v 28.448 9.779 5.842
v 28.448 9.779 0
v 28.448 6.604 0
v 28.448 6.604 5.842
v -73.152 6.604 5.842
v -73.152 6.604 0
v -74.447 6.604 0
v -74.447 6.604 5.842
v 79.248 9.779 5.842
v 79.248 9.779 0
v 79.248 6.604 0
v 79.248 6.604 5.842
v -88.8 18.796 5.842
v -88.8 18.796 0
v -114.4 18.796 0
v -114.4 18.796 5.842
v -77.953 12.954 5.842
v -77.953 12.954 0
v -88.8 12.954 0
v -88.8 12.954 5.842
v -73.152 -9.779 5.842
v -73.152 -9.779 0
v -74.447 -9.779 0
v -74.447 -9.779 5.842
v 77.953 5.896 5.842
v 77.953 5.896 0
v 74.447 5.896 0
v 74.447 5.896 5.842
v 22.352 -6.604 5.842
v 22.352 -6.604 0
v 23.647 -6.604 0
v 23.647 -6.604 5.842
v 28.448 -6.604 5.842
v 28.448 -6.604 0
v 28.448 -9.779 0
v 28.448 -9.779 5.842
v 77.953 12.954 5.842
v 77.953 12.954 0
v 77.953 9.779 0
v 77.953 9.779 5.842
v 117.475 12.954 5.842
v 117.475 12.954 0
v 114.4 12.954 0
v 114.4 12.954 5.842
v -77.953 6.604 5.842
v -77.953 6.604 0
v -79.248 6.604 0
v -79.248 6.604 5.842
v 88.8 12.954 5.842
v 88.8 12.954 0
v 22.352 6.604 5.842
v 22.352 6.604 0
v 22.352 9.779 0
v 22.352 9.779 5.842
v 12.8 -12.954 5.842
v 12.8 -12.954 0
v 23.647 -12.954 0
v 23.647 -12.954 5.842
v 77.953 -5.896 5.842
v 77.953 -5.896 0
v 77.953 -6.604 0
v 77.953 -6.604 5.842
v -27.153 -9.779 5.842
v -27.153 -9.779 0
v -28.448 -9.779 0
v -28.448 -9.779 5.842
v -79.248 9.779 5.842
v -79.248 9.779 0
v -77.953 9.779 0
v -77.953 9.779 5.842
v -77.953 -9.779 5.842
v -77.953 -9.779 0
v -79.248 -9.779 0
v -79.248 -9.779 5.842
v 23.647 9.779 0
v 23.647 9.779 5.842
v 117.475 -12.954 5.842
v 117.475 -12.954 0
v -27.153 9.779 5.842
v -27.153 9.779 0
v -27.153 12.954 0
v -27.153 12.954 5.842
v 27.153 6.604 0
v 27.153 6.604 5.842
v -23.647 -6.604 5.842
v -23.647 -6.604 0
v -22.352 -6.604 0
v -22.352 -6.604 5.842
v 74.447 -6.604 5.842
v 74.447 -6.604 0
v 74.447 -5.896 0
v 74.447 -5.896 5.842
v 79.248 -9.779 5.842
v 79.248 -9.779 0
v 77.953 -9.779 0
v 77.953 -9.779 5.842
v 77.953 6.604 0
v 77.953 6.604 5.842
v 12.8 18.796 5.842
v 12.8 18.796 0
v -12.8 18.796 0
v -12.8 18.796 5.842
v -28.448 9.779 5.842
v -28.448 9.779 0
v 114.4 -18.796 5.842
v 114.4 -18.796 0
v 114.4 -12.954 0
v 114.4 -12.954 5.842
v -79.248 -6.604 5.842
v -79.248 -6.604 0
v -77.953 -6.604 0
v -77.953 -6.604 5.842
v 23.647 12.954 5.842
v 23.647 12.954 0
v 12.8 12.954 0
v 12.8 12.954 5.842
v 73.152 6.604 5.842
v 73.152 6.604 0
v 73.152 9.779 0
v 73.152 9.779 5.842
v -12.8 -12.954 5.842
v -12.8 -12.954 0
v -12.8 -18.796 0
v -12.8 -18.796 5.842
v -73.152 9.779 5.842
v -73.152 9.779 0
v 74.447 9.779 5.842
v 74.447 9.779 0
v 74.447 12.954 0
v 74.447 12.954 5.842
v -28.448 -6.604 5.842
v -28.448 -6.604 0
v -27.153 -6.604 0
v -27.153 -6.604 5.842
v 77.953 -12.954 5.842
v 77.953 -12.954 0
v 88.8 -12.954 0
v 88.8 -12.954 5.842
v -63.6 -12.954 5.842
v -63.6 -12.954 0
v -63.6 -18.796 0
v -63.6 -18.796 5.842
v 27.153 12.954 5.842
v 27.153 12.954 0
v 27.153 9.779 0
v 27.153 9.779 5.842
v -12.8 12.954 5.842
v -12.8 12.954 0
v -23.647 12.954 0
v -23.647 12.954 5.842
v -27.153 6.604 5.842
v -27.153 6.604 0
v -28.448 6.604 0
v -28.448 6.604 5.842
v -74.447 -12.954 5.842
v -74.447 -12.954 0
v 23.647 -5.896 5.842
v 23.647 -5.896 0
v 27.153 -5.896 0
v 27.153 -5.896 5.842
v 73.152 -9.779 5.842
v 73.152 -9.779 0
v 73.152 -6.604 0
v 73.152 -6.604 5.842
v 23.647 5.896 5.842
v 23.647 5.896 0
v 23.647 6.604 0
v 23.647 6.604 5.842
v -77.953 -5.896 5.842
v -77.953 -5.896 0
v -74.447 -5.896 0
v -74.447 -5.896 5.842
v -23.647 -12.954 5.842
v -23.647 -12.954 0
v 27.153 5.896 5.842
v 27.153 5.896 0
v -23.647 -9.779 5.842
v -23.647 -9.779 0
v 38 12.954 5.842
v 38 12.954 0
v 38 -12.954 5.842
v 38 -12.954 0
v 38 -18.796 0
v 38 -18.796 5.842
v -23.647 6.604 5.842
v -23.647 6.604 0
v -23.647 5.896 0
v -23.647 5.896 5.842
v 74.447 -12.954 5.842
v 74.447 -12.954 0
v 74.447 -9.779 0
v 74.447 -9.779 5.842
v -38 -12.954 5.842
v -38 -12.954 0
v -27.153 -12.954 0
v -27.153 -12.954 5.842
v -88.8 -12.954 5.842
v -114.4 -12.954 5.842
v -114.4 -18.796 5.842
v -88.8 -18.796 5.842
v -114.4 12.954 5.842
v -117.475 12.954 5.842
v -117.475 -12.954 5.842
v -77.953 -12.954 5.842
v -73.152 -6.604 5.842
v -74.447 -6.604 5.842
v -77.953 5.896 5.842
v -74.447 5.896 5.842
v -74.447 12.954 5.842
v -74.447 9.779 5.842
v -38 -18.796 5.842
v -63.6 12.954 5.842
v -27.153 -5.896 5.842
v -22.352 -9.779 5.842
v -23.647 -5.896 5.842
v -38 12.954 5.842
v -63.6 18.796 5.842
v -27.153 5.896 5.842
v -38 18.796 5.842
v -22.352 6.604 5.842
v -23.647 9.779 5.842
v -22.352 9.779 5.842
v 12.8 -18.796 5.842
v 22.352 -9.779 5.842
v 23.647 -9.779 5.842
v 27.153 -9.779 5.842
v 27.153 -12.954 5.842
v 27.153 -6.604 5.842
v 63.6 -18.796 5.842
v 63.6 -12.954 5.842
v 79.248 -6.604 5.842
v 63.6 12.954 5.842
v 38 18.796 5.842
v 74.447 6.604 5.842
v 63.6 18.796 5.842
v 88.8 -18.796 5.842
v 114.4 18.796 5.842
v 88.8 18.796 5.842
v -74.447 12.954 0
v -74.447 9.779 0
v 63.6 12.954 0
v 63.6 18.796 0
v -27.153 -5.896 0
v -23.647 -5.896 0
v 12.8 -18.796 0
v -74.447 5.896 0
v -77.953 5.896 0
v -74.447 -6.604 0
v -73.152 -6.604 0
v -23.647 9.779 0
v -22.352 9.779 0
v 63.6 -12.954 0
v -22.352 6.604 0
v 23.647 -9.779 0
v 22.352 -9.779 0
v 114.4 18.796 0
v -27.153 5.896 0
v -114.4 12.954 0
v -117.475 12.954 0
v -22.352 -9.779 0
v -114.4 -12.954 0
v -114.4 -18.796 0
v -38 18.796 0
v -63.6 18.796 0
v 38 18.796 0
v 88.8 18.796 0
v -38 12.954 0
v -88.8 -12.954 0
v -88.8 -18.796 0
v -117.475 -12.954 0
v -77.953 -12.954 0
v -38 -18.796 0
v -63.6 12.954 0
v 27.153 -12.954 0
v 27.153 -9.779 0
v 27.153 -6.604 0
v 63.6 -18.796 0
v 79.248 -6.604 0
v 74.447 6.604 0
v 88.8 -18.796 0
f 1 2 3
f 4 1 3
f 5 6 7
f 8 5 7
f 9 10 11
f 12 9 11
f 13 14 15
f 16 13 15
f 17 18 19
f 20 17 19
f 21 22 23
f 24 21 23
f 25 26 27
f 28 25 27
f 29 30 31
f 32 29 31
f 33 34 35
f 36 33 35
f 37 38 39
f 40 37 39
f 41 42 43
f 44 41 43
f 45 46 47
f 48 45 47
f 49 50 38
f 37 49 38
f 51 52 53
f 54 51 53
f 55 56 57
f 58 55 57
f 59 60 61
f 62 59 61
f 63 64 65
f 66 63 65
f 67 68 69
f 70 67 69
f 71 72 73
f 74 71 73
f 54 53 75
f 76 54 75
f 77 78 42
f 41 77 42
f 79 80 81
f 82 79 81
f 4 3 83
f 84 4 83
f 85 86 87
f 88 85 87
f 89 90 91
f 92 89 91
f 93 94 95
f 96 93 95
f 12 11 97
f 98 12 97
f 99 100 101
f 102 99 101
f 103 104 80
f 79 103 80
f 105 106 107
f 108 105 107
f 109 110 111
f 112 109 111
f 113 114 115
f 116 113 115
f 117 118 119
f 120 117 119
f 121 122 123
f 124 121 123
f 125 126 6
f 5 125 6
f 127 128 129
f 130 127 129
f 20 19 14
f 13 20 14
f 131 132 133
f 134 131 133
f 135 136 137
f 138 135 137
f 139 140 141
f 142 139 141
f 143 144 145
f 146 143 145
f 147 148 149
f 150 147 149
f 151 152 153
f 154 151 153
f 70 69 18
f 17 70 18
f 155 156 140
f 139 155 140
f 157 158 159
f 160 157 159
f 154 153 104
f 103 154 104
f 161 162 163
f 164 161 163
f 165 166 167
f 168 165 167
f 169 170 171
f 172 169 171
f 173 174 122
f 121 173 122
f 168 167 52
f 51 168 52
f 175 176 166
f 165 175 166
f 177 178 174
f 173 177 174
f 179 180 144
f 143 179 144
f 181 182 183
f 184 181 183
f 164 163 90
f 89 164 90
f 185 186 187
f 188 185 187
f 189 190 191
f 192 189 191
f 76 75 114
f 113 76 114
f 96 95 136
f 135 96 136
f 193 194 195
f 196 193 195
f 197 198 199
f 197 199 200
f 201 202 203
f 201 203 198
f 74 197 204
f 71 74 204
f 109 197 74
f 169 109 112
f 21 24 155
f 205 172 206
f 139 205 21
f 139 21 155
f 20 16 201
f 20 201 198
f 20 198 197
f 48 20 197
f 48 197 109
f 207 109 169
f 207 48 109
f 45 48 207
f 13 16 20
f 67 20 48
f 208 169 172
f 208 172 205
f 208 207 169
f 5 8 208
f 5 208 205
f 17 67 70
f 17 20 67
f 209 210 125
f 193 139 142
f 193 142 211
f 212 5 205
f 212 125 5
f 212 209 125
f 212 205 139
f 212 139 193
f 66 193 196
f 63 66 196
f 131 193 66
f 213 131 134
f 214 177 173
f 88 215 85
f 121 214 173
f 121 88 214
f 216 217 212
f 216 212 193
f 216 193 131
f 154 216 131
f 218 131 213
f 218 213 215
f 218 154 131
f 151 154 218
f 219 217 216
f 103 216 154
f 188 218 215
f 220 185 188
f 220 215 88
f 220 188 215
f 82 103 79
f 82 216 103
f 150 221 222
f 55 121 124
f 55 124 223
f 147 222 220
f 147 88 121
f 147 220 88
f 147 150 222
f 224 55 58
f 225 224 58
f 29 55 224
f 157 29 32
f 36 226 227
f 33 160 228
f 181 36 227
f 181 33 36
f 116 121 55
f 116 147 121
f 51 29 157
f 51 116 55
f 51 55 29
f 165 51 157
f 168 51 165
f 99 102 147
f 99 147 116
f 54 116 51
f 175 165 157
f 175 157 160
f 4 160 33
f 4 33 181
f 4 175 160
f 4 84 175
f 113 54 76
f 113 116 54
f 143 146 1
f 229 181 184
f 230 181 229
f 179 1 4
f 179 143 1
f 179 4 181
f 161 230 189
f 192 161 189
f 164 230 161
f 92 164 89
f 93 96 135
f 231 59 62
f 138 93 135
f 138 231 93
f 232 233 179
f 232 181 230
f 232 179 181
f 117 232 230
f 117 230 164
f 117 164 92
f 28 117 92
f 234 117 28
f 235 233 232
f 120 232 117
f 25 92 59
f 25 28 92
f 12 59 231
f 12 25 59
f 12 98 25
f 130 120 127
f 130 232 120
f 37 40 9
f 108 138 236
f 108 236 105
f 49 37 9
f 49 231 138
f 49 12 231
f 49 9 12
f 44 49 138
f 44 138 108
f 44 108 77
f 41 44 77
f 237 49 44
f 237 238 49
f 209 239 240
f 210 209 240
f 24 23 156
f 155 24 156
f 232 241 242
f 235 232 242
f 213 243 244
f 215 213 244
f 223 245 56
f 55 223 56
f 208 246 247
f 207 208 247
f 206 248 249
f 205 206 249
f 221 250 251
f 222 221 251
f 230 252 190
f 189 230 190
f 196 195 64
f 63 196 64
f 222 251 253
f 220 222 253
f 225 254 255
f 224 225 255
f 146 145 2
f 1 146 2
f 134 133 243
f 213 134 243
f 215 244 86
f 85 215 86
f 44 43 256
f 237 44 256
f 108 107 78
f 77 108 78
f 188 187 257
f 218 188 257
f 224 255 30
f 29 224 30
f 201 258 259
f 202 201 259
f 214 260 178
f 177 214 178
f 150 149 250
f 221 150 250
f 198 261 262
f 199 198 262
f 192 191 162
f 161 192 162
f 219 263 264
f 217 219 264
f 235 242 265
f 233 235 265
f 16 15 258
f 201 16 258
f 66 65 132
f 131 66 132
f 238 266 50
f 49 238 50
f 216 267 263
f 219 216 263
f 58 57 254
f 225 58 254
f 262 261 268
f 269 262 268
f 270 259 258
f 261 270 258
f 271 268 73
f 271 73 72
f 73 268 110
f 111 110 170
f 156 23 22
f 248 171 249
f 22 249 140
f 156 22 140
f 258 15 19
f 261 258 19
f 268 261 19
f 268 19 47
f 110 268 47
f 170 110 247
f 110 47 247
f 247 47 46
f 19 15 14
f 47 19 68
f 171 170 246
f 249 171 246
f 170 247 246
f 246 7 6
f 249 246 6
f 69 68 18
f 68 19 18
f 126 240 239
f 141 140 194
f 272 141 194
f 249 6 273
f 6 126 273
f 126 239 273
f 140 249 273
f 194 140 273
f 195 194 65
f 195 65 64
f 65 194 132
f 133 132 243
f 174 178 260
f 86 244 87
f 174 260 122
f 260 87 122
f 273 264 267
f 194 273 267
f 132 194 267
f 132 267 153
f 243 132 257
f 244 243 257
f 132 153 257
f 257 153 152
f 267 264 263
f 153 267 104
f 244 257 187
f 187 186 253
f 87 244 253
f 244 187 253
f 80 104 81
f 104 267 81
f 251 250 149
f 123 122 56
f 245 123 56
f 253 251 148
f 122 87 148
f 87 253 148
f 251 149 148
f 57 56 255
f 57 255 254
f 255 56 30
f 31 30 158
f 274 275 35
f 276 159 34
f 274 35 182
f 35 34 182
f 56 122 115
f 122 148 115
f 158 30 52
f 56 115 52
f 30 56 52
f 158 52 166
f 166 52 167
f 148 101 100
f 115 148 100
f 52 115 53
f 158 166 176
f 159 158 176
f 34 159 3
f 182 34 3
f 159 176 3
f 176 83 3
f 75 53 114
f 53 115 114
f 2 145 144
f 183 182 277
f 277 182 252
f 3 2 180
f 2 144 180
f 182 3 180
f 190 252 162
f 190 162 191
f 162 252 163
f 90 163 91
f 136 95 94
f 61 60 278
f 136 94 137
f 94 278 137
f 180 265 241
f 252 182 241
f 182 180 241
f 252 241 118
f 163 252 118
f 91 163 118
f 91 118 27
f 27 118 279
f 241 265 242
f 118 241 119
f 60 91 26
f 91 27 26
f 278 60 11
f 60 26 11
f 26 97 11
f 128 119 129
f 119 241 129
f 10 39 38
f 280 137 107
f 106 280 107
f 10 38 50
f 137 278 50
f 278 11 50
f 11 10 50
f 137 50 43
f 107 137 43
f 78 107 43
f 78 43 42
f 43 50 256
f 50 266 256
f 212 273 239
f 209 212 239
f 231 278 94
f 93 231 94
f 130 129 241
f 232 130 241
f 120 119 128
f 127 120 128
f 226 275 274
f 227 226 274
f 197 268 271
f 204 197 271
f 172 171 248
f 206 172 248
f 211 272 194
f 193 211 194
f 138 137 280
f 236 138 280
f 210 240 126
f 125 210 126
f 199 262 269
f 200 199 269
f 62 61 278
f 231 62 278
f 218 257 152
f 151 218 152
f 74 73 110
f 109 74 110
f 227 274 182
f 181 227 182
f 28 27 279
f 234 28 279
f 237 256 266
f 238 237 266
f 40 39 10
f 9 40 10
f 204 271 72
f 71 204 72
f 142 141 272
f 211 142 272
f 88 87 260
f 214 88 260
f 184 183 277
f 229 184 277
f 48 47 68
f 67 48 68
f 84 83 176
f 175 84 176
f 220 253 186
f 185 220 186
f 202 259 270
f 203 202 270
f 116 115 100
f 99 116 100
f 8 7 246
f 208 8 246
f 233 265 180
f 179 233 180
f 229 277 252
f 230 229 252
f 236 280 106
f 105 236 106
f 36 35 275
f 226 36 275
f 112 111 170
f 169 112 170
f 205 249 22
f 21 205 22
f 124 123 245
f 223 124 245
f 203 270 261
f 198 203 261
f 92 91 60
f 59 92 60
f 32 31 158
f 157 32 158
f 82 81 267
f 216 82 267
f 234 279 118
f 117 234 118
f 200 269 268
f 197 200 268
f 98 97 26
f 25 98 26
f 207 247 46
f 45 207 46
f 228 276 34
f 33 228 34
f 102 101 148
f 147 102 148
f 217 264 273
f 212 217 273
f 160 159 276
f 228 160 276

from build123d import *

# Parameters (mm, degrees)
BOSS_EXTRUDE1_DEPTH = 5.842


with BuildPart() as part:
    # Sketch1 → Boss-Extrude1 (new body)
    with BuildSketch(Plane.XY):
        Polygon((-38, 18.796), (-63.6, 18.796), (-63.6, 12.954), (-74.4474, 12.954), (-74.4474, 9.779), (-73.152, 9.779), (-73.152, 6.604), (-74.4474, 6.604), (-74.4474, 5.896), (-77.9526, 5.896), (-77.9526, 6.604), (-79.248, 6.604), (-79.248, 9.779), (-77.9526, 9.779), (-77.9526, 12.954), (-88.8, 12.954), (-88.8, 18.796), (-114.4, 18.796), (-114.4, 12.954), (-117.475, 12.954), (-117.475, -12.954), (-114.4, -12.954), (-114.4, -18.796), (-88.8, -18.796), (-88.8, -12.954), (-77.9526, -12.954), (-77.9526, -9.779), (-79.248, -9.779), (-79.248, -6.604), (-77.9526, -6.604), (-77.9526, -5.896), (-74.4474, -5.896), (-74.4474, -6.604), (-73.152, -6.604), (-73.152, -9.779), (-74.4474, -9.779), (-74.4474, -12.954), (-63.6, -12.954), (-63.6, -18.796), (-38, -18.796), (-38, -12.954), (-27.1526, -12.954), (-27.1526, -9.779), (-28.448, -9.779), (-28.448, -6.604), (-27.1526, -6.604), (-27.1526, -5.896), (-23.6474, -5.896), (-23.6474, -6.604), (-22.352, -6.604), (-22.352, -9.779), (-23.6474, -9.779), (-23.6474, -12.954), (-12.8, -12.954), (-12.8, -18.796), (12.8, -18.796), (12.8, -12.954), (23.6474, -12.954), (23.6474, -9.779), (22.352, -9.779), (22.352, -6.604), (23.6474, -6.604), (23.6474, -5.896), (27.1526, -5.896), (27.1526, -6.604), (28.448, -6.604), (28.448, -9.779), (27.1526, -9.779), (27.1526, -12.954), (38, -12.954), (38, -18.796), (63.6, -18.796), (63.6, -12.954), (74.4474, -12.954), (74.4474, -9.779), (73.152, -9.779), (73.152, -6.604), (74.4474, -6.604), (74.4474, -5.896), (77.9526, -5.896), (77.9526, -6.604), (79.248, -6.604), (79.248, -9.779), (77.9526, -9.779), (77.9526, -12.954), (88.8, -12.954), (88.8, -18.796), (114.4, -18.796), (114.4, -12.954), (117.475, -12.954), (117.475, 12.954), (114.4, 12.954), (114.4, 18.796), (88.8, 18.796), (88.8, 12.954), (77.9526, 12.954), (77.9526, 9.779), (79.248, 9.779), (79.248, 6.604), (77.9526, 6.604), (77.9526, 5.896), (74.4474, 5.896), (74.4474, 6.604), (73.152, 6.604), (73.152, 9.779), (74.4474, 9.779), (74.4474, 12.954), (63.6, 12.954), (63.6, 18.796), (38, 18.796), (38, 12.954), (27.1526, 12.954), (27.1526, 9.779), (28.448, 9.779), (28.448, 6.604), (27.1526, 6.604), (27.1526, 5.896), (23.6474, 5.896), (23.6474, 6.604), (22.352, 6.604), (22.352, 9.779), (23.6474, 9.779), (23.6474, 12.954), (12.8, 12.954), (12.8, 18.796), (-12.8, 18.796), (-12.8, 12.954), (-23.6474, 12.954), (-23.6474, 9.779), (-22.352, 9.779), (-22.352, 6.604), (-23.6474, 6.604), (-23.6474, 5.896), (-27.1526, 5.896), (-27.1526, 6.604), (-28.448, 6.604), (-28.448, 9.779), (-27.1526, 9.779), (-27.1526, 12.954), (-38, 12.954), align=None)
    extrude(amount=BOSS_EXTRUDE1_DEPTH)


solid = part.part
